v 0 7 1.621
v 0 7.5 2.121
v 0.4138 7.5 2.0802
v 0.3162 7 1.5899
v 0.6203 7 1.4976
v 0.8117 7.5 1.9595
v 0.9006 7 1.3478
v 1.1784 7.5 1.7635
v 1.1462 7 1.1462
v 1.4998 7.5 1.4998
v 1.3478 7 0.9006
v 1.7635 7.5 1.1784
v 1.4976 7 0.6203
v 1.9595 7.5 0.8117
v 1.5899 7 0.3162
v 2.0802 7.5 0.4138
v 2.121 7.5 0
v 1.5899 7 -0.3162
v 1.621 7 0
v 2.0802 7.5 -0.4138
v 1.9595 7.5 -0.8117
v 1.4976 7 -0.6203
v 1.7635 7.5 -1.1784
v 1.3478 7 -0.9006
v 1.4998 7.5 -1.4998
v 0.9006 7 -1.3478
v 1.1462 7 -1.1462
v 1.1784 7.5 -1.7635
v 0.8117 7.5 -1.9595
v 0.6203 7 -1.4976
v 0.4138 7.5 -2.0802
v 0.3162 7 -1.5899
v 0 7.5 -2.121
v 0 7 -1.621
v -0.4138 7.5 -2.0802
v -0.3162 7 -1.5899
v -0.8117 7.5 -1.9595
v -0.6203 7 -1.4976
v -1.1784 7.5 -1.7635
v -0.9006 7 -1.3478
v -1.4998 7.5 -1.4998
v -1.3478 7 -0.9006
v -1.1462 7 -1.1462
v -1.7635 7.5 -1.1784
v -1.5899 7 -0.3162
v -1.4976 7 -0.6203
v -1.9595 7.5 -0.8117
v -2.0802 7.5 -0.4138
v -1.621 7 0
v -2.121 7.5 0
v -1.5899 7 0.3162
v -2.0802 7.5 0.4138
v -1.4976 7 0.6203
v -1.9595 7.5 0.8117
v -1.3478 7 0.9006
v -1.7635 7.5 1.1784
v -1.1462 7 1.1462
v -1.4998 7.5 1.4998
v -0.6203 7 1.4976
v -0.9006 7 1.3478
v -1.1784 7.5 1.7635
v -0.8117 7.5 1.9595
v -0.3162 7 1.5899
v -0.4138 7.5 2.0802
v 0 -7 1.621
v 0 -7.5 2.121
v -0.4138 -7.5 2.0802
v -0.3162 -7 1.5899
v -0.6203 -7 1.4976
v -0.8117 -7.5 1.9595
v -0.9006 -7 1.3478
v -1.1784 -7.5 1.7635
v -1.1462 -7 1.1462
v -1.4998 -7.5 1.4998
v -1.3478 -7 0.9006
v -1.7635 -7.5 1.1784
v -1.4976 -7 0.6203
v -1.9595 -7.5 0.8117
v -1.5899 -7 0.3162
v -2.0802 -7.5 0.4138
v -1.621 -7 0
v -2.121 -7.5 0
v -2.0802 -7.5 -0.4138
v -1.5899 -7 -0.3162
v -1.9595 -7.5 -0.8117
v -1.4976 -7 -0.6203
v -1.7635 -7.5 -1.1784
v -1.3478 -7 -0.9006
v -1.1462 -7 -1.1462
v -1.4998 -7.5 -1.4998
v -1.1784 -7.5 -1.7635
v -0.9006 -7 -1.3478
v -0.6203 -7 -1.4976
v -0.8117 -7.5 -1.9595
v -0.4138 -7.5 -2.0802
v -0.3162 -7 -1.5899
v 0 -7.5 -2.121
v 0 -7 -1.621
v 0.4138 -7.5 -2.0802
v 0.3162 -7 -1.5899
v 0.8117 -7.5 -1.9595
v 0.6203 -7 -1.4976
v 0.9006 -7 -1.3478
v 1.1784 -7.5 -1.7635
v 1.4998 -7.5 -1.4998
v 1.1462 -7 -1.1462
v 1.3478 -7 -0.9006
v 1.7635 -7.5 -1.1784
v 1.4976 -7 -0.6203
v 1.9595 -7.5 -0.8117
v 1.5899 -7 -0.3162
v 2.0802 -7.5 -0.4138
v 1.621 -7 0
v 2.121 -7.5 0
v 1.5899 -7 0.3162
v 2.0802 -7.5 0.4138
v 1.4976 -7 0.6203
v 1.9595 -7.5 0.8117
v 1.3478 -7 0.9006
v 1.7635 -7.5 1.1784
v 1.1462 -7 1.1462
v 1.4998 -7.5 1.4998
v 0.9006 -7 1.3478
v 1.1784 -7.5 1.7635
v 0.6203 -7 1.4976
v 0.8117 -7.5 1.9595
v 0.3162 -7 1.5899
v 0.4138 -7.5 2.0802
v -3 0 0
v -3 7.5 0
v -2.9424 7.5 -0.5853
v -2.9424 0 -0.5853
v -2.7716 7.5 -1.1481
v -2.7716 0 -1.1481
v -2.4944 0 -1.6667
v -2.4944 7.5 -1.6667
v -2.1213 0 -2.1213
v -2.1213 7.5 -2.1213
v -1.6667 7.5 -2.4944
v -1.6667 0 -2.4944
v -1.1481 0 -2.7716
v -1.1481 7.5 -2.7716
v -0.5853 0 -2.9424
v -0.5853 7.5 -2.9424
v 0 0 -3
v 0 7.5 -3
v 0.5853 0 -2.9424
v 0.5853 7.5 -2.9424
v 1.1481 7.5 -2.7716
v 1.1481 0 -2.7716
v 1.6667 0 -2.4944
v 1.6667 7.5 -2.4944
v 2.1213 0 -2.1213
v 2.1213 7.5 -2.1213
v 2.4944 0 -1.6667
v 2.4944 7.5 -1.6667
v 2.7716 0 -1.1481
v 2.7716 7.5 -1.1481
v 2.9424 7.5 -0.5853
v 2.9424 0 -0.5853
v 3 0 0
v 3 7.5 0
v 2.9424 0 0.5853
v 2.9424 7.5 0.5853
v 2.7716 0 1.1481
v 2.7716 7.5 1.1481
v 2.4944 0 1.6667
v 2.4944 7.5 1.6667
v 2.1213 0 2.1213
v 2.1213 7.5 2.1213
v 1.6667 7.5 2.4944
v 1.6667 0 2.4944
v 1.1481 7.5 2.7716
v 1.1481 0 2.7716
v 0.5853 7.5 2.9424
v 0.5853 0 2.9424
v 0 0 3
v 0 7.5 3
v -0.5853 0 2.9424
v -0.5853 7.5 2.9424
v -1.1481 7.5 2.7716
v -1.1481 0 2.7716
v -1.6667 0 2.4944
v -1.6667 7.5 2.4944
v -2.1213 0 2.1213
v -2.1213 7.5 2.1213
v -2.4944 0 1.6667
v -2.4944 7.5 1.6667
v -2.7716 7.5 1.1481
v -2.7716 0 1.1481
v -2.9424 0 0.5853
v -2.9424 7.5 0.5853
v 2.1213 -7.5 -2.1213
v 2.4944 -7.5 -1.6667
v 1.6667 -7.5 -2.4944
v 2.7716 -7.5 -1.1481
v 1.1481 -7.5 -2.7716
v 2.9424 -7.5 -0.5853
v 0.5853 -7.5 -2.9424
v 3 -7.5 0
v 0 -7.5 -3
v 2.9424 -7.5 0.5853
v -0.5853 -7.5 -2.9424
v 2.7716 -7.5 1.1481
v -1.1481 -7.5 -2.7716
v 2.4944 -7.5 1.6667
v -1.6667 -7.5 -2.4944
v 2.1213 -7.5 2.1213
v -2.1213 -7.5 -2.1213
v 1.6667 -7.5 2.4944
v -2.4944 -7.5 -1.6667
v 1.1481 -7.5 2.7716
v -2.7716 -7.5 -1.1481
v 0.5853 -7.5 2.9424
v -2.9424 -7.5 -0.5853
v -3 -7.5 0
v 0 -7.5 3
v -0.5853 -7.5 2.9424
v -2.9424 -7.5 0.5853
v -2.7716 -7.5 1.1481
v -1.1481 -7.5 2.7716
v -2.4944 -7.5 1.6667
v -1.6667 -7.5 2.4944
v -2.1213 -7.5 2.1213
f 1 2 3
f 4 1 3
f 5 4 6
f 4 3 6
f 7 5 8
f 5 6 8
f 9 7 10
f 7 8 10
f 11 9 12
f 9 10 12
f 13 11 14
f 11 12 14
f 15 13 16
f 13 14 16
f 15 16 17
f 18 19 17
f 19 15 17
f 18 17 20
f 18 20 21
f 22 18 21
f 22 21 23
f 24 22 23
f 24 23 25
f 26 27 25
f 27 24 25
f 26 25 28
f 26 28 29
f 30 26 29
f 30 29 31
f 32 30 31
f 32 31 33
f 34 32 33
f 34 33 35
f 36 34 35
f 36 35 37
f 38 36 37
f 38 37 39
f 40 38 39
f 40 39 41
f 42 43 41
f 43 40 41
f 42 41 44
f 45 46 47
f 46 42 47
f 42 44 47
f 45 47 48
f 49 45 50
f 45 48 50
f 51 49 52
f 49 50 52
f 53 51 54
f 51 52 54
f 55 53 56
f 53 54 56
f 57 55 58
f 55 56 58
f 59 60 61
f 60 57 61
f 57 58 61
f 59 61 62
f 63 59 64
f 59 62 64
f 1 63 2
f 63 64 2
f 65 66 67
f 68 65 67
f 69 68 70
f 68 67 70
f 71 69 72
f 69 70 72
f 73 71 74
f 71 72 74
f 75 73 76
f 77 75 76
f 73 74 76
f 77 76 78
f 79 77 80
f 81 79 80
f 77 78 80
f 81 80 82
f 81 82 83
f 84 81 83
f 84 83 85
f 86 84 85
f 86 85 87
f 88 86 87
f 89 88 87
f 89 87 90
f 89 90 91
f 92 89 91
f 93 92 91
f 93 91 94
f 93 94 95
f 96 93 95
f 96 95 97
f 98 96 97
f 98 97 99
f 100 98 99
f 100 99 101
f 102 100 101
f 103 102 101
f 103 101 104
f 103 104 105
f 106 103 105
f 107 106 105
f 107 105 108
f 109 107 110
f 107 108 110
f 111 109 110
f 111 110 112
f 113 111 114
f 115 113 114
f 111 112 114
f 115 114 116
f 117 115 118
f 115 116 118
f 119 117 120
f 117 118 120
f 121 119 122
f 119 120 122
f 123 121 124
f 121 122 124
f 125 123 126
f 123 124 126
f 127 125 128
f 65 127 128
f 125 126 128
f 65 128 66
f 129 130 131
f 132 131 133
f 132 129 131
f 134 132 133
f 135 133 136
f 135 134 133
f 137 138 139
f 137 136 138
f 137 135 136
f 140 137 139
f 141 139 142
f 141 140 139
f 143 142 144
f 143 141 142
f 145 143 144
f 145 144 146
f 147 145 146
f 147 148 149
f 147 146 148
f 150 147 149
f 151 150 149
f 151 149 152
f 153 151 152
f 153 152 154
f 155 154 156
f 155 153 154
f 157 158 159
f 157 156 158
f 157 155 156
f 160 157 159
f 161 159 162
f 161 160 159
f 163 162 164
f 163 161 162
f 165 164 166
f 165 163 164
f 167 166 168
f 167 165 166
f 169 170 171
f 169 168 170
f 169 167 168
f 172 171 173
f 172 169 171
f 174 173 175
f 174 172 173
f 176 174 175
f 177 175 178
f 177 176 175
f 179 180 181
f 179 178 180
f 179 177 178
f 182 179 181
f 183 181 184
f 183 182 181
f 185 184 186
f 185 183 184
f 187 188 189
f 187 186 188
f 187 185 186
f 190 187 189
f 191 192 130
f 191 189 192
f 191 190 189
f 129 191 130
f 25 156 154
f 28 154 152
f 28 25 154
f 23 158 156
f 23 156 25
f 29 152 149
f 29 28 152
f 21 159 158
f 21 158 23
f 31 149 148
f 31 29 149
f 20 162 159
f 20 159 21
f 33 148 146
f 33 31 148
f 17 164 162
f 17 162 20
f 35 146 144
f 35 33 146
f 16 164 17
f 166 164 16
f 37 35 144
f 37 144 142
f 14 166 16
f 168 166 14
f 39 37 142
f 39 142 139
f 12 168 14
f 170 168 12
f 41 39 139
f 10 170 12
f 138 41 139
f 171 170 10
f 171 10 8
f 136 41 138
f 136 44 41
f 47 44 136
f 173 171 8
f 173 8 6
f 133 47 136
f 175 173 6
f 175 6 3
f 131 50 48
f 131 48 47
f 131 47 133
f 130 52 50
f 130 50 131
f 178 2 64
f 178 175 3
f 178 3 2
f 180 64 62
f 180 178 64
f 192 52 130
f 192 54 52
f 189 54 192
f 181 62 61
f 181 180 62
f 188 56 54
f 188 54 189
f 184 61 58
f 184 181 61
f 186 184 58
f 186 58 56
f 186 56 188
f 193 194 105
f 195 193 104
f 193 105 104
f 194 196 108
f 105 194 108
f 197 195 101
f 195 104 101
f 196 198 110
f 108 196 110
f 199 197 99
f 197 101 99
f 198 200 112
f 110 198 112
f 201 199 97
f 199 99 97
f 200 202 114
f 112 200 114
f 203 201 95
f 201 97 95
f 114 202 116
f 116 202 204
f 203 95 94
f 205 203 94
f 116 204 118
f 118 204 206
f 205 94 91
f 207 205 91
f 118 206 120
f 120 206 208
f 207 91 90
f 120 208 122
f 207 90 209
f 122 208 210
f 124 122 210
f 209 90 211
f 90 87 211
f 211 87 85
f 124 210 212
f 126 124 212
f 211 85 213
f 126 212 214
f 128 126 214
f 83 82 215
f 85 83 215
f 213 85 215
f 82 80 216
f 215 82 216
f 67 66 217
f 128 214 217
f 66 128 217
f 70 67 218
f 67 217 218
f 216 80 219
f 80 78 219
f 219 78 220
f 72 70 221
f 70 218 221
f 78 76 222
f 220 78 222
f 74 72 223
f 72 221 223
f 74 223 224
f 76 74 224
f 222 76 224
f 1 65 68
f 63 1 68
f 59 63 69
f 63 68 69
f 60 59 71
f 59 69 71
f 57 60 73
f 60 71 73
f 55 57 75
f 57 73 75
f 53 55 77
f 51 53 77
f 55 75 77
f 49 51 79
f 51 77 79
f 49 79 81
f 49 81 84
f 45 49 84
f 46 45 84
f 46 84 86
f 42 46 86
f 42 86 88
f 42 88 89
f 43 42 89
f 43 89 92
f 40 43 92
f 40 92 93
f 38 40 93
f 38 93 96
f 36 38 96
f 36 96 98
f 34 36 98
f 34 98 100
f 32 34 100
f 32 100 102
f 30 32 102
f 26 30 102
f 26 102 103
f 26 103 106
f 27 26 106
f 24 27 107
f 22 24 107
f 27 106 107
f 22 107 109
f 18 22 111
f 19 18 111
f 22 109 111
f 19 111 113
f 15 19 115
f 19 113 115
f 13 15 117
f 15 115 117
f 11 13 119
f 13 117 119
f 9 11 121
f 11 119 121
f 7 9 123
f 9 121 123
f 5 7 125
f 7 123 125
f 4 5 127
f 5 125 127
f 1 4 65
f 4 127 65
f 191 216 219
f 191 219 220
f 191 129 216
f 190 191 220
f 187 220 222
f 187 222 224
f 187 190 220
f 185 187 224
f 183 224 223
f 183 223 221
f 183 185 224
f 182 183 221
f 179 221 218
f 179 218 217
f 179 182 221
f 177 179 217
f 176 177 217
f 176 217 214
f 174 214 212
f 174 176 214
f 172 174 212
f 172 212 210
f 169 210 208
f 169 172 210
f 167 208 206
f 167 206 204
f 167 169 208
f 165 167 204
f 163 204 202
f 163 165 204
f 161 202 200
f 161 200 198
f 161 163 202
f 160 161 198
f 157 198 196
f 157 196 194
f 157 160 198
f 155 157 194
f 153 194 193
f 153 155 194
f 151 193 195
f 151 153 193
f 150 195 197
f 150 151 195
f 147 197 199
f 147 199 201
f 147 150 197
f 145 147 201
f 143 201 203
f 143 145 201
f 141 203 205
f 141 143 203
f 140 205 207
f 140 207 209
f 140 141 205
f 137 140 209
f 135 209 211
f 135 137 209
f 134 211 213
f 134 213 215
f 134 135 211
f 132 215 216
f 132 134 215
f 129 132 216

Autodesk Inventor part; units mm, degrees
ref_plane "YZ Plane" through (0, 0, 0) normal (1, 0, 0) x (0, 1, 0)
ref_plane "XZ Plane" through (0, 0, 0) normal (0, 1, 0) x (-1, 0, 0)
ref_plane "XY Plane" through (0, 0, 0) normal (0, 0, 1) x (1, 0, 0)
sketch "Sketch1" plane through (0, 0, 0) normal (0, 1, 0) x (-1, 0, 0)
  circle A0 centre (0, 0) radius 3
  dimension "d0" = 6
extrude "Extrusion1" add sketch "Sketch1" along normal mid plane 15
sketch "Sketch2" plane through (0, 7.5, 0) normal (0, 1, 0) x (1, 0, 0)
  point P0 (0, 0)
  point P1 (0, 0)
hole "Hole1" at (0, 7.5, 0) direction (0, -1, 0) diameter 3.242 depth 15 thread size "M4x0.7" class "6H" standard "ANSI Metric M Profile"
chamfer "Chamfer1" distance 0.5 angle 45 2 edges at (0, 7.5, -1.621) (0, -7.5, -1.621)
properties part number "Standoff_GB"
